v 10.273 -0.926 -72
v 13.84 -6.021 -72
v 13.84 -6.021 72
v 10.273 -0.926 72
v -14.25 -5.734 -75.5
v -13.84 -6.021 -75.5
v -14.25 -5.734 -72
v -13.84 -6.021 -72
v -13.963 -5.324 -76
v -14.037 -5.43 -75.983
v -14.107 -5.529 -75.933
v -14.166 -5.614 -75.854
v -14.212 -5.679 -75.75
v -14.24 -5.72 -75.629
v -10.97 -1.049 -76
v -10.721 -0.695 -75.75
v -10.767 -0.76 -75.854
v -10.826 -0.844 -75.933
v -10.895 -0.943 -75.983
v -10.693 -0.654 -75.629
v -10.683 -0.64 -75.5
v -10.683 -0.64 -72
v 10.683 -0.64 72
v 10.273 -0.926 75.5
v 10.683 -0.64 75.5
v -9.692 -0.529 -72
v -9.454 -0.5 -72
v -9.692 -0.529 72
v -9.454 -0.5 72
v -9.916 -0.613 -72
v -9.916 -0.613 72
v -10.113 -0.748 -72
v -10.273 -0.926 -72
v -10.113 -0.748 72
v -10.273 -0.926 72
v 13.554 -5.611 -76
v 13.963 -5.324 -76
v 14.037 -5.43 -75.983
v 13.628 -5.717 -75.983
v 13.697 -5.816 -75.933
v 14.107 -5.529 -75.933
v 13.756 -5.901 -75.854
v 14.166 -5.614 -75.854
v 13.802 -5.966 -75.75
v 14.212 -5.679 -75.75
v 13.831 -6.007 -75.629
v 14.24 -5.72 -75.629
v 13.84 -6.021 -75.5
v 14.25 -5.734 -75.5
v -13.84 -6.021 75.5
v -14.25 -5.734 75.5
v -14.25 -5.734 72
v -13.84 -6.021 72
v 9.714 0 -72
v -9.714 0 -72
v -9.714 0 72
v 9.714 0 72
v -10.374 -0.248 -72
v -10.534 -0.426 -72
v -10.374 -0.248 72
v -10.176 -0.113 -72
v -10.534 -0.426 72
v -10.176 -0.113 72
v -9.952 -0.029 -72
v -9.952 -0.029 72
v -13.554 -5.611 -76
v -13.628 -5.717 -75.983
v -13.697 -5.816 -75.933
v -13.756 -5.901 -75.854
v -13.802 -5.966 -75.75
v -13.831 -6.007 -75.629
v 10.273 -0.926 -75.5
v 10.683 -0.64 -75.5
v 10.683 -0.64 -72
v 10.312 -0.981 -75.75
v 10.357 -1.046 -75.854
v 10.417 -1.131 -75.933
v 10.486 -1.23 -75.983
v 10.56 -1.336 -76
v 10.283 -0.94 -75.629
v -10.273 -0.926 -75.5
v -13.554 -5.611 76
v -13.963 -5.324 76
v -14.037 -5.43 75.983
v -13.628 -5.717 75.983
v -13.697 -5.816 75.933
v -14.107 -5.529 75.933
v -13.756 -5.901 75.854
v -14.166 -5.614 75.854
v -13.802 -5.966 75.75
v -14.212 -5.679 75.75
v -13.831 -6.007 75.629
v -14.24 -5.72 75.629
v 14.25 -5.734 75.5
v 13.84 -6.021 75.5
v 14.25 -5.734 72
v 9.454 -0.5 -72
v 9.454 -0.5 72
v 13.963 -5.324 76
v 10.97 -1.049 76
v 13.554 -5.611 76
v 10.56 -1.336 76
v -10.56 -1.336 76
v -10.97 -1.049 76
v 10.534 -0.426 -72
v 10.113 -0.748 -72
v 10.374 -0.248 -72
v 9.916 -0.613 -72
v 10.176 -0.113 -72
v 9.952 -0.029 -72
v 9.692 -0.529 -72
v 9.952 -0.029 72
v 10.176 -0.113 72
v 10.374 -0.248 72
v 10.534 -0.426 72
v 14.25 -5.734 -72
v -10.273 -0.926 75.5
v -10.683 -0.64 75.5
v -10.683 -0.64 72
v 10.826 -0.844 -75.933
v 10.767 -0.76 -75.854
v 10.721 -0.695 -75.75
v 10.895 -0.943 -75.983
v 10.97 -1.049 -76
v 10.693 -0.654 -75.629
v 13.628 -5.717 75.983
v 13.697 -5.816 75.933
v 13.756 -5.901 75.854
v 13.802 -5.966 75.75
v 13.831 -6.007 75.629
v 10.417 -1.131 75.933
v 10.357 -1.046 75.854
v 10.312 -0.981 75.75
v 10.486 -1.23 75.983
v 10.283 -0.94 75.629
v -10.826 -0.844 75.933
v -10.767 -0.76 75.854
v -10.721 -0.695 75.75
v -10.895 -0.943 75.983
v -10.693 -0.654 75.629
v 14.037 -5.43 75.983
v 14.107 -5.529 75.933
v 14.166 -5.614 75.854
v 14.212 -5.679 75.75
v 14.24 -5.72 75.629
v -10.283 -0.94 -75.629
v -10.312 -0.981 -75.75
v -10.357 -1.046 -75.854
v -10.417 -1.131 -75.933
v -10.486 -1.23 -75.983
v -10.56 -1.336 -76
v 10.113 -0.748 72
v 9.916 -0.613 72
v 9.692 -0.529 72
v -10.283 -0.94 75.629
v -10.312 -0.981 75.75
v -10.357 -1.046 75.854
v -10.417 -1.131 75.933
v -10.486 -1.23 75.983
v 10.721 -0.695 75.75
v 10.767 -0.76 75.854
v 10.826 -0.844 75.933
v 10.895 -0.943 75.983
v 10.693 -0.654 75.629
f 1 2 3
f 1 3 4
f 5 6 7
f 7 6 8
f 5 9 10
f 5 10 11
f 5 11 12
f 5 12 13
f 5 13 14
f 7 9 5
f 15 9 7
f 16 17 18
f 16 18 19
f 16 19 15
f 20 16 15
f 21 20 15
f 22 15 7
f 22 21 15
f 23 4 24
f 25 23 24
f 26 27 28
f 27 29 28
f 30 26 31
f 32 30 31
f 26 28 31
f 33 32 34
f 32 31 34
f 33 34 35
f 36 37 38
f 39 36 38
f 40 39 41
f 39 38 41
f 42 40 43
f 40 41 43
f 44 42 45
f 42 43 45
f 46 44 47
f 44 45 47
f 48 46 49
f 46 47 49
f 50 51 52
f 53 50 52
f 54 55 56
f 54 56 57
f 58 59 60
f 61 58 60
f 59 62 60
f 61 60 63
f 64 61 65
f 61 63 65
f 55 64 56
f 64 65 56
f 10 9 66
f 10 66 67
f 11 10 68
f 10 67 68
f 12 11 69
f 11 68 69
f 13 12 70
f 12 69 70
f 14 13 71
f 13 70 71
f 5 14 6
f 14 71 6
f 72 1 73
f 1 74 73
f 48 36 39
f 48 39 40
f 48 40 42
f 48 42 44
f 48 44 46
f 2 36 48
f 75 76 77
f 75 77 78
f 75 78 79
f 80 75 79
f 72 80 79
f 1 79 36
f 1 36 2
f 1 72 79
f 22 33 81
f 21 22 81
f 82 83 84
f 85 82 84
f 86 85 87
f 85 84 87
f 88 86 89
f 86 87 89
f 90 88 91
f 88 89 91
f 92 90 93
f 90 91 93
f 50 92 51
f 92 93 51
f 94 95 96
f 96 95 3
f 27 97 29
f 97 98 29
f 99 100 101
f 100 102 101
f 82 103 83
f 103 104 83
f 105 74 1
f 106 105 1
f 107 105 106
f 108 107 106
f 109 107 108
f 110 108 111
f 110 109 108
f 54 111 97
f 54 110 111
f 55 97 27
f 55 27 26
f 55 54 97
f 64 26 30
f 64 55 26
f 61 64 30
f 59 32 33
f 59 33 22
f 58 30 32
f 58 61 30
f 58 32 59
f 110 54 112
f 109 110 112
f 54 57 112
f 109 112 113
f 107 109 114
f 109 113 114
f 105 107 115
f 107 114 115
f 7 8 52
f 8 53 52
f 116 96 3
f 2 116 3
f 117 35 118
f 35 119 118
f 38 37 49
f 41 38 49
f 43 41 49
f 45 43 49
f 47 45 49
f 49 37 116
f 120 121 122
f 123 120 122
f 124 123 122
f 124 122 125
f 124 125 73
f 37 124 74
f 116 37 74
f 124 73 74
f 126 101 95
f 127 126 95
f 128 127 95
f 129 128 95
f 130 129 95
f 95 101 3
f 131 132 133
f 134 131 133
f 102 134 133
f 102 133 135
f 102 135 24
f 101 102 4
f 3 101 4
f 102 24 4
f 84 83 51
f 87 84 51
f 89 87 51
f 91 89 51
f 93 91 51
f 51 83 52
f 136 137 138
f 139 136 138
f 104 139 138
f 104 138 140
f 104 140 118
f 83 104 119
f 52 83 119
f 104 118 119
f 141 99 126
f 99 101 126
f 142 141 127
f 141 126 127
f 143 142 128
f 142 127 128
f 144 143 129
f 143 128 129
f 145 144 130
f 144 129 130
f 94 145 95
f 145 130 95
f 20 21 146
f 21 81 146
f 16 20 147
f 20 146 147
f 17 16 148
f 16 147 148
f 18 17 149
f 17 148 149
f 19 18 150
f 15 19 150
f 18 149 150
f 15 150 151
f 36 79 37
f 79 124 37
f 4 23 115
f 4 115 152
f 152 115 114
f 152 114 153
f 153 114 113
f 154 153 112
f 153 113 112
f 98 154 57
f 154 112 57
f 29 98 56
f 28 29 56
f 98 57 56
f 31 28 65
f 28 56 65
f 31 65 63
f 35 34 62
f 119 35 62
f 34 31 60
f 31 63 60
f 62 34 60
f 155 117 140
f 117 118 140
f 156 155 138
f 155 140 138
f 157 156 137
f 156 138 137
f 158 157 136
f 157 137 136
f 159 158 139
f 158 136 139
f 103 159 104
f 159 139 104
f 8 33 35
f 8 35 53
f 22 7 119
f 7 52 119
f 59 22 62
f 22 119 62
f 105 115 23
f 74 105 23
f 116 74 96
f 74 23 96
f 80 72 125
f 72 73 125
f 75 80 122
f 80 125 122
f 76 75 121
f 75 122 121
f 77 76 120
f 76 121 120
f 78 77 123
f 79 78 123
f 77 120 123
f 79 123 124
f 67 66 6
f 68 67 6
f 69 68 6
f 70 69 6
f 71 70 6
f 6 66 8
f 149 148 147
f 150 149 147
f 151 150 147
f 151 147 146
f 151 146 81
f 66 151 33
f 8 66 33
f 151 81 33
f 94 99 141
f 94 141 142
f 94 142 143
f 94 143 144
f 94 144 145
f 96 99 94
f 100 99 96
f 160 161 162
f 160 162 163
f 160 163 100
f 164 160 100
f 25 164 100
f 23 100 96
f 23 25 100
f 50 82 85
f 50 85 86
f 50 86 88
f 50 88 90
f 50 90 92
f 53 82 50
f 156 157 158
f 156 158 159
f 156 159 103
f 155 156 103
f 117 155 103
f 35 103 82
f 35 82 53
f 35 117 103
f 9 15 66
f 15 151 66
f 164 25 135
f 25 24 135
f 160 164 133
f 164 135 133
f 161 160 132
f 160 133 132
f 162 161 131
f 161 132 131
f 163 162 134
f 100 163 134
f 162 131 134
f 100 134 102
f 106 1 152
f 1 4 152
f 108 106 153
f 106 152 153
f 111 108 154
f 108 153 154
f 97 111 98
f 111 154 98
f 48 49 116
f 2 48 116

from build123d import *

# Parameters (mm, degrees)
BOSS_EXTRUDE1_DEPTH = 72
BOSS_EXTRUDE2_DEPTH = 0.25
BOSS_EXTRUDE3_DEPTH = 0.25


with BuildPart() as part:
    # Sketch2 → Boss-Extrude1 (new, symmetric)
    with BuildSketch(Plane.XY):
        with BuildLine():
            Line((13.840423978, -6.020852528), (10.273266414, -0.926423564))
            ThreePointArc((10.273266414, -0.926423564), (9.915862983, -0.612989167), (9.45411437, -0.5))
            Line((9.45411437, -0.5), (-9.45411437, -0.5))
            ThreePointArc((-9.45411437, -0.5), (-9.915862983, -0.612989167), (-10.273266414, -0.926423564))
            Line((-10.273266414, -0.926423564), (-13.840423978, -6.020852528))
            Line((-13.840423978, -6.020852528), (-14.25, -5.73406431))
            Line((-14.25, -5.73406431), (-10.533549939, -0.426423564))
            ThreePointArc((-10.533549939, -0.426423564), (-10.176146508, -0.112989167), (-9.714397895, 0))
            Line((-9.714397895, 0), (9.714397895, 0))
            ThreePointArc((9.714397895, 0), (10.176146508, -0.112989167), (10.533549939, -0.426423564))
            Line((10.533549939, -0.426423564), (14.25, -5.73406431))
            Line((14.25, -5.73406431), (13.840423978, -6.020852528))
        make_face()
    extrude(amount=BOSS_EXTRUDE1_DEPTH, both=True)

    # Sketch3 → Boss-Extrude2 (add, symmetric)
    with BuildSketch(Plane(origin=(6.662976551, 4.665466408, 0), x_dir=(0, 0, -1), z_dir=(0.8191520442889926, 0.5735764363510449, 0))):
        with BuildLine():
            Line((-72, -6.651385295), (-75.5, -6.651385295))
            ThreePointArc((-75.5, -6.651385295), (-75.853553391, -6.797831905), (-76, -7.151385295))
            Line((-76, -7.151385295), (-76, -12.37053472))
            ThreePointArc((-76, -12.37053472), (-75.853553391, -12.72408811), (-75.5, -12.87053472))
            Line((-75.5, -12.87053472), (-72, -12.87053472))
            Line((-72, -12.87053472), (-72, -6.651385295))
        make_face()
        with BuildLine():
            Line((72, -12.87053472), (72, -6.651385295))
            Line((72, -6.651385295), (75.5, -6.651385295))
            ThreePointArc((75.5, -6.651385295), (75.853553391, -6.797831905), (76, -7.151385295))
            Line((76, -7.151385295), (76, -12.37053472))
            ThreePointArc((76, -12.37053472), (75.853553391, -12.72408811), (75.5, -12.87053472))
            Line((75.5, -12.87053472), (72, -12.87053472))
        make_face()
    extrude(amount=BOSS_EXTRUDE2_DEPTH, both=True)

    # Sketch4 → Boss-Extrude3 (add, symmetric)
    with BuildSketch(Plane(origin=(-6.662976551, 4.665466408, 0), x_dir=(0, 0, 1), z_dir=(-0.819152044288993, 0.5735764363510446, 0))):
        with BuildLine():
            Line((-72, -6.651385295), (-75.5, -6.651385295))
            ThreePointArc((-75.5, -6.651385295), (-75.853553391, -6.797831905), (-76, -7.151385295))
            Line((-76, -7.151385295), (-76, -12.37053472))
            ThreePointArc((-76, -12.37053472), (-75.853553391, -12.72408811), (-75.5, -12.87053472))
            Line((-75.5, -12.87053472), (-72, -12.87053472))
            Line((-72, -12.87053472), (-72, -6.651385295))
        make_face()
        with BuildLine():
            Line((72, -12.87053472), (72, -6.651385295))
            Line((72, -6.651385295), (75.5, -6.651385295))
            ThreePointArc((75.5, -6.651385295), (75.853553391, -6.797831905), (76, -7.151385295))
            Line((76, -7.151385295), (76, -12.37053472))
            ThreePointArc((76, -12.37053472), (75.853553391, -12.72408811), (75.5, -12.87053472))
            Line((75.5, -12.87053472), (72, -12.87053472))
        make_face()
    extrude(amount=BOSS_EXTRUDE3_DEPTH, both=True)


solid = part.part
